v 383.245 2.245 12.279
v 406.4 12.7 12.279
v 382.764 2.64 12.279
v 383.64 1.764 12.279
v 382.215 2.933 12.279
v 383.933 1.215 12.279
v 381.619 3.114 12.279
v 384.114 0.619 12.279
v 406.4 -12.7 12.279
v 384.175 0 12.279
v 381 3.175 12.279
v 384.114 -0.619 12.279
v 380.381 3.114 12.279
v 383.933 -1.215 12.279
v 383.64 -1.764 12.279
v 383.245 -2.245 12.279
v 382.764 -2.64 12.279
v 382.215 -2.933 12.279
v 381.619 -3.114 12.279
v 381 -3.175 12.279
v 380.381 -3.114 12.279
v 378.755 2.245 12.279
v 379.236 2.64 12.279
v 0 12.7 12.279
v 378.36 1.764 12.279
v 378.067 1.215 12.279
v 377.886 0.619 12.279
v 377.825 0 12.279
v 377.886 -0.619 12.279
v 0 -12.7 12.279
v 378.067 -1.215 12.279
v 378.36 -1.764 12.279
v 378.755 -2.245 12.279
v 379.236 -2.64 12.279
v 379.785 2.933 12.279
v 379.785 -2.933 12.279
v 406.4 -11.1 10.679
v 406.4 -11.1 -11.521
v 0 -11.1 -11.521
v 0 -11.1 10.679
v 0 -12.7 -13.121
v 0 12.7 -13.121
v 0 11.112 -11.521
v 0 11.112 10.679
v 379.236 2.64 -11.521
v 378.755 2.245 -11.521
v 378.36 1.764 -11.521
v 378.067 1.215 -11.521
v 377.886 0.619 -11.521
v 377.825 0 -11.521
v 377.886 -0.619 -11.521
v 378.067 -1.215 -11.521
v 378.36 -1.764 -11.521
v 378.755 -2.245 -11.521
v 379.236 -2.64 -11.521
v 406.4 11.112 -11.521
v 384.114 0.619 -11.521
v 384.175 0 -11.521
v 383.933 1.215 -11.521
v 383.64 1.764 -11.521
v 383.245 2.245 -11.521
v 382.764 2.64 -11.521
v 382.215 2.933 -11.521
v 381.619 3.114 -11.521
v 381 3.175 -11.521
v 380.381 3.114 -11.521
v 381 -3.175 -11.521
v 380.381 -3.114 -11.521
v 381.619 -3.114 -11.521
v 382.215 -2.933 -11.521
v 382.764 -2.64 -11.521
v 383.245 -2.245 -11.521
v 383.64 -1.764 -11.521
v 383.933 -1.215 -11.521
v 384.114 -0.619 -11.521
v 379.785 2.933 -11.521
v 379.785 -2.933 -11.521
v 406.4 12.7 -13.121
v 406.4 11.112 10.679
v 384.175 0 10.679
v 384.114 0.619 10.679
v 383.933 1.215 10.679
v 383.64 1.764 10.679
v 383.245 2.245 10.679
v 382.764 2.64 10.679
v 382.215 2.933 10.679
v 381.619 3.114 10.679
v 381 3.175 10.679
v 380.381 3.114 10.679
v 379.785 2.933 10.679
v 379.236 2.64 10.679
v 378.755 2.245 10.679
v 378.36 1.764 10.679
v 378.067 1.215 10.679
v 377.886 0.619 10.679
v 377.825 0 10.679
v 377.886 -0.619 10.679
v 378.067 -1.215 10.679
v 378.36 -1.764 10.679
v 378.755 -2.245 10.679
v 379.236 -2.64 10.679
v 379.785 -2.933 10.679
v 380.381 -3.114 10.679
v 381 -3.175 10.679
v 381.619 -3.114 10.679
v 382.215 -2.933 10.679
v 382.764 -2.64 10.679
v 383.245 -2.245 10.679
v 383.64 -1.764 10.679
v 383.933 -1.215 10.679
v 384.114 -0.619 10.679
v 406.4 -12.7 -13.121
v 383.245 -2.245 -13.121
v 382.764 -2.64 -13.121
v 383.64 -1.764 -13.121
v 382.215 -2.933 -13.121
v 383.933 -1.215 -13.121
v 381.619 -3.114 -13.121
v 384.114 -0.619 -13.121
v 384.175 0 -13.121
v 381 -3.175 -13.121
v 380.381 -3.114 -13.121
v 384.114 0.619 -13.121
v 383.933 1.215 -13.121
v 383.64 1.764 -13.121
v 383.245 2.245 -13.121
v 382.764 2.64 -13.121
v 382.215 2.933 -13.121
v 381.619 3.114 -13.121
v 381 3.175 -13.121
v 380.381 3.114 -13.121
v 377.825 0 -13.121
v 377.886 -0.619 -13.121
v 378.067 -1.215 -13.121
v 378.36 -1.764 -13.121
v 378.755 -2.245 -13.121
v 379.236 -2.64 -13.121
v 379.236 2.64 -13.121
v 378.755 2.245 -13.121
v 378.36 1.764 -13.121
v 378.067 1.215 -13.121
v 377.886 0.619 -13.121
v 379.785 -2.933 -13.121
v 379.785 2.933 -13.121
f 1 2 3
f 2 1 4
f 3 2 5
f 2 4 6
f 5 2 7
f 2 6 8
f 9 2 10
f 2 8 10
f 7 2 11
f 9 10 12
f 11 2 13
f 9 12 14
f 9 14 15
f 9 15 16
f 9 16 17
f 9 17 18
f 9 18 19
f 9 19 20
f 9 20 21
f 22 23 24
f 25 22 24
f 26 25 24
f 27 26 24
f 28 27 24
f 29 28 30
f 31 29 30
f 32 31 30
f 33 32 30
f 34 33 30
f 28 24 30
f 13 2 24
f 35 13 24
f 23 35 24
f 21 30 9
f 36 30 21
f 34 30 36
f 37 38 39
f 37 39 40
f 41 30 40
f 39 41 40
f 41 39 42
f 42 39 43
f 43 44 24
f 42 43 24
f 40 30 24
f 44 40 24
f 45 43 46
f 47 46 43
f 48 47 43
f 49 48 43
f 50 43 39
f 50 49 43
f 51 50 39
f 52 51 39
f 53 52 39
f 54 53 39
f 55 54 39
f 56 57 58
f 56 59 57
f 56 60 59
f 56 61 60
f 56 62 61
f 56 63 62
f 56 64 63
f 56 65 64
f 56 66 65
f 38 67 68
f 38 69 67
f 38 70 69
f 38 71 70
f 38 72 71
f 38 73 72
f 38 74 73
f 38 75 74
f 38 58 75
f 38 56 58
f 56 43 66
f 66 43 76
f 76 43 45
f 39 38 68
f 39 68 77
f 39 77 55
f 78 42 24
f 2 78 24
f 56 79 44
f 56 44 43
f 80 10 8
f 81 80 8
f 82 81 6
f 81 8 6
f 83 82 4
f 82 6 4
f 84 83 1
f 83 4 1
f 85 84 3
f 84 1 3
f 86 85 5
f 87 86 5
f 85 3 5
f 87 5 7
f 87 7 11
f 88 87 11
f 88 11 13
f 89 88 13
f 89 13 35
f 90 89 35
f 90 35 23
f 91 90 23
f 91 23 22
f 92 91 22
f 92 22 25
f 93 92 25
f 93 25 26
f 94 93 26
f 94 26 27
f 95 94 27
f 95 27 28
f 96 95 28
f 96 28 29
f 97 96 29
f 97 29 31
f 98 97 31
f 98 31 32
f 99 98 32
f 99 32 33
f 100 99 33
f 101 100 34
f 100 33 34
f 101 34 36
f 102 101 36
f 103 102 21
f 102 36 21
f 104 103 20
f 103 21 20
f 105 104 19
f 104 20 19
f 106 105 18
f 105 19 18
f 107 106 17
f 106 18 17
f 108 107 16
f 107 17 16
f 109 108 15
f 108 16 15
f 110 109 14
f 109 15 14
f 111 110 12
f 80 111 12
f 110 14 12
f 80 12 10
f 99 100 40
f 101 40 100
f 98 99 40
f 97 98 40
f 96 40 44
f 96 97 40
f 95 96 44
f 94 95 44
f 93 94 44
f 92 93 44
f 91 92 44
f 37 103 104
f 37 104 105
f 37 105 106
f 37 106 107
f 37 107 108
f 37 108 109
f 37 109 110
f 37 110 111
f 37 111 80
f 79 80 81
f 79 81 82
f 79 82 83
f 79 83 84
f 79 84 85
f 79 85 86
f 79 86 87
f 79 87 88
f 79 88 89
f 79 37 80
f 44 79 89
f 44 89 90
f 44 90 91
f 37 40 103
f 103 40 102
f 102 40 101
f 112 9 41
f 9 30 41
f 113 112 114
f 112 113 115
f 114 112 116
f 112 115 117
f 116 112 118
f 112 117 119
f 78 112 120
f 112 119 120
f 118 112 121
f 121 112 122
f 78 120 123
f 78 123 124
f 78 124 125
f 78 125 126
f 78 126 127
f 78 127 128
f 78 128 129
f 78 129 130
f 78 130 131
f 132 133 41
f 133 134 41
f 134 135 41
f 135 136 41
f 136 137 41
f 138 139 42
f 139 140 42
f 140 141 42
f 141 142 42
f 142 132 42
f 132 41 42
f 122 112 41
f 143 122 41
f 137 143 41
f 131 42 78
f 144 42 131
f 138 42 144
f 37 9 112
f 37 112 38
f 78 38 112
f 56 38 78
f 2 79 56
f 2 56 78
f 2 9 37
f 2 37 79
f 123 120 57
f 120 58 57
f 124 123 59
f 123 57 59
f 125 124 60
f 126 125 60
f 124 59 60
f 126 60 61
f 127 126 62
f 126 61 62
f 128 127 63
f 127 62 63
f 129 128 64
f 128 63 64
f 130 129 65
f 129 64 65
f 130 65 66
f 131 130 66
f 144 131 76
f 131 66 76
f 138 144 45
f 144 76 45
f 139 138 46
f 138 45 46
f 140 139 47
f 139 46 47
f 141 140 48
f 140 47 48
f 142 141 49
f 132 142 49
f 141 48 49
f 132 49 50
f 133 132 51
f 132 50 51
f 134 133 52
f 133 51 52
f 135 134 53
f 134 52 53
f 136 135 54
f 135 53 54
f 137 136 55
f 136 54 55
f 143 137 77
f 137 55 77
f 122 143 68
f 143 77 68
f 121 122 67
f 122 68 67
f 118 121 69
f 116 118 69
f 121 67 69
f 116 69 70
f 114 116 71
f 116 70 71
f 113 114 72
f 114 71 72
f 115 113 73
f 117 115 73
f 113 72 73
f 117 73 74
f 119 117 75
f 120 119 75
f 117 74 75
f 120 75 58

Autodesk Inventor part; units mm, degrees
ref_plane "YZ Plane" through (0, 0, 0) normal (1, 0, 0) x (0, 1, 0)
ref_plane "XZ Plane" through (0, 0, 0) normal (0, 1, 0) x (-1, 0, 0)
ref_plane "XY Plane" through (0, 0, 0) normal (0, 0, 1) x (1, 0, 0)
sketch "Sketch1" plane through (0, 0, 0) normal (1, 0, 0) x (0, 1, 0)
  line L0 (12.7, 12.2788) -> (-12.7, 12.2788)
  line L1 (-12.7, 12.2788) -> (-12.7, -13.1212)
  line L2 (-12.7, -13.1212) -> (12.7, -13.1212)
  line L3 (12.7, -13.1212) -> (12.7, 12.2788)
  line L4 (0, 32.4321) -> (0, -31.5519)
  line L5 (24.3369, 0) -> (-19.9975, 0)
  point P0 (0, 0)
  dimension "d0" = 25.4
extrude "Extrusion1" add sketch "Sketch1" along normal blind 406.4
sketch "Sketch3" plane through (406.4, 0, 0) normal (1, 0, 0) x (0, 0, -1)
  line L0 (-10.6786, 11.1125) -> (11.521, 11.1125)
  line L1 (11.521, 11.1125) -> (11.521, -11.0998)
  line L2 (11.521, -11.0998) -> (-10.6786, -11.0998)
  line L3 (-10.6786, -11.0998) -> (-10.6786, 11.1125)
  line L4 (13.1212, 12.7) -> (-12.2788, 12.7) projected
  line L5 (-12.2788, 12.7) -> (-12.2788, -12.7) projected
  line L6 (13.1212, -12.7) -> (13.1212, 12.7) projected
  line L7 (-12.2788, -12.7) -> (13.1212, -12.7) projected
  point P0 (0, 0)
  dimension "d5" = 1.5875
  dimension "d6" = 1.6002
  dimension "d7" = 1.6002
  dimension "d8" = 1.6002
extrude "Extrusion2" cut sketch "Sketch3" against normal through all contours L0 L1 L2 L3
sketch "Sketch4" plane through (0, -12.7, 12.2788) normal (0, 0, 1) x (1, 0, 0)
  circle A0 centre (381, 12.7) radius 3.175
  line L0 (406.4, 25.4) -> (406.4, 0) projected
  point P0 (0, 12.7)
  point P1 (406.4, 12.7)
  point P2 (406.4, 12.7)
  dimension "d11" = 6.35
  dimension "d12" = 25.4
extrude "Extrusion3" cut sketch "Sketch4" against normal through all
properties part number "Channel" material "Aluminum 6061"
